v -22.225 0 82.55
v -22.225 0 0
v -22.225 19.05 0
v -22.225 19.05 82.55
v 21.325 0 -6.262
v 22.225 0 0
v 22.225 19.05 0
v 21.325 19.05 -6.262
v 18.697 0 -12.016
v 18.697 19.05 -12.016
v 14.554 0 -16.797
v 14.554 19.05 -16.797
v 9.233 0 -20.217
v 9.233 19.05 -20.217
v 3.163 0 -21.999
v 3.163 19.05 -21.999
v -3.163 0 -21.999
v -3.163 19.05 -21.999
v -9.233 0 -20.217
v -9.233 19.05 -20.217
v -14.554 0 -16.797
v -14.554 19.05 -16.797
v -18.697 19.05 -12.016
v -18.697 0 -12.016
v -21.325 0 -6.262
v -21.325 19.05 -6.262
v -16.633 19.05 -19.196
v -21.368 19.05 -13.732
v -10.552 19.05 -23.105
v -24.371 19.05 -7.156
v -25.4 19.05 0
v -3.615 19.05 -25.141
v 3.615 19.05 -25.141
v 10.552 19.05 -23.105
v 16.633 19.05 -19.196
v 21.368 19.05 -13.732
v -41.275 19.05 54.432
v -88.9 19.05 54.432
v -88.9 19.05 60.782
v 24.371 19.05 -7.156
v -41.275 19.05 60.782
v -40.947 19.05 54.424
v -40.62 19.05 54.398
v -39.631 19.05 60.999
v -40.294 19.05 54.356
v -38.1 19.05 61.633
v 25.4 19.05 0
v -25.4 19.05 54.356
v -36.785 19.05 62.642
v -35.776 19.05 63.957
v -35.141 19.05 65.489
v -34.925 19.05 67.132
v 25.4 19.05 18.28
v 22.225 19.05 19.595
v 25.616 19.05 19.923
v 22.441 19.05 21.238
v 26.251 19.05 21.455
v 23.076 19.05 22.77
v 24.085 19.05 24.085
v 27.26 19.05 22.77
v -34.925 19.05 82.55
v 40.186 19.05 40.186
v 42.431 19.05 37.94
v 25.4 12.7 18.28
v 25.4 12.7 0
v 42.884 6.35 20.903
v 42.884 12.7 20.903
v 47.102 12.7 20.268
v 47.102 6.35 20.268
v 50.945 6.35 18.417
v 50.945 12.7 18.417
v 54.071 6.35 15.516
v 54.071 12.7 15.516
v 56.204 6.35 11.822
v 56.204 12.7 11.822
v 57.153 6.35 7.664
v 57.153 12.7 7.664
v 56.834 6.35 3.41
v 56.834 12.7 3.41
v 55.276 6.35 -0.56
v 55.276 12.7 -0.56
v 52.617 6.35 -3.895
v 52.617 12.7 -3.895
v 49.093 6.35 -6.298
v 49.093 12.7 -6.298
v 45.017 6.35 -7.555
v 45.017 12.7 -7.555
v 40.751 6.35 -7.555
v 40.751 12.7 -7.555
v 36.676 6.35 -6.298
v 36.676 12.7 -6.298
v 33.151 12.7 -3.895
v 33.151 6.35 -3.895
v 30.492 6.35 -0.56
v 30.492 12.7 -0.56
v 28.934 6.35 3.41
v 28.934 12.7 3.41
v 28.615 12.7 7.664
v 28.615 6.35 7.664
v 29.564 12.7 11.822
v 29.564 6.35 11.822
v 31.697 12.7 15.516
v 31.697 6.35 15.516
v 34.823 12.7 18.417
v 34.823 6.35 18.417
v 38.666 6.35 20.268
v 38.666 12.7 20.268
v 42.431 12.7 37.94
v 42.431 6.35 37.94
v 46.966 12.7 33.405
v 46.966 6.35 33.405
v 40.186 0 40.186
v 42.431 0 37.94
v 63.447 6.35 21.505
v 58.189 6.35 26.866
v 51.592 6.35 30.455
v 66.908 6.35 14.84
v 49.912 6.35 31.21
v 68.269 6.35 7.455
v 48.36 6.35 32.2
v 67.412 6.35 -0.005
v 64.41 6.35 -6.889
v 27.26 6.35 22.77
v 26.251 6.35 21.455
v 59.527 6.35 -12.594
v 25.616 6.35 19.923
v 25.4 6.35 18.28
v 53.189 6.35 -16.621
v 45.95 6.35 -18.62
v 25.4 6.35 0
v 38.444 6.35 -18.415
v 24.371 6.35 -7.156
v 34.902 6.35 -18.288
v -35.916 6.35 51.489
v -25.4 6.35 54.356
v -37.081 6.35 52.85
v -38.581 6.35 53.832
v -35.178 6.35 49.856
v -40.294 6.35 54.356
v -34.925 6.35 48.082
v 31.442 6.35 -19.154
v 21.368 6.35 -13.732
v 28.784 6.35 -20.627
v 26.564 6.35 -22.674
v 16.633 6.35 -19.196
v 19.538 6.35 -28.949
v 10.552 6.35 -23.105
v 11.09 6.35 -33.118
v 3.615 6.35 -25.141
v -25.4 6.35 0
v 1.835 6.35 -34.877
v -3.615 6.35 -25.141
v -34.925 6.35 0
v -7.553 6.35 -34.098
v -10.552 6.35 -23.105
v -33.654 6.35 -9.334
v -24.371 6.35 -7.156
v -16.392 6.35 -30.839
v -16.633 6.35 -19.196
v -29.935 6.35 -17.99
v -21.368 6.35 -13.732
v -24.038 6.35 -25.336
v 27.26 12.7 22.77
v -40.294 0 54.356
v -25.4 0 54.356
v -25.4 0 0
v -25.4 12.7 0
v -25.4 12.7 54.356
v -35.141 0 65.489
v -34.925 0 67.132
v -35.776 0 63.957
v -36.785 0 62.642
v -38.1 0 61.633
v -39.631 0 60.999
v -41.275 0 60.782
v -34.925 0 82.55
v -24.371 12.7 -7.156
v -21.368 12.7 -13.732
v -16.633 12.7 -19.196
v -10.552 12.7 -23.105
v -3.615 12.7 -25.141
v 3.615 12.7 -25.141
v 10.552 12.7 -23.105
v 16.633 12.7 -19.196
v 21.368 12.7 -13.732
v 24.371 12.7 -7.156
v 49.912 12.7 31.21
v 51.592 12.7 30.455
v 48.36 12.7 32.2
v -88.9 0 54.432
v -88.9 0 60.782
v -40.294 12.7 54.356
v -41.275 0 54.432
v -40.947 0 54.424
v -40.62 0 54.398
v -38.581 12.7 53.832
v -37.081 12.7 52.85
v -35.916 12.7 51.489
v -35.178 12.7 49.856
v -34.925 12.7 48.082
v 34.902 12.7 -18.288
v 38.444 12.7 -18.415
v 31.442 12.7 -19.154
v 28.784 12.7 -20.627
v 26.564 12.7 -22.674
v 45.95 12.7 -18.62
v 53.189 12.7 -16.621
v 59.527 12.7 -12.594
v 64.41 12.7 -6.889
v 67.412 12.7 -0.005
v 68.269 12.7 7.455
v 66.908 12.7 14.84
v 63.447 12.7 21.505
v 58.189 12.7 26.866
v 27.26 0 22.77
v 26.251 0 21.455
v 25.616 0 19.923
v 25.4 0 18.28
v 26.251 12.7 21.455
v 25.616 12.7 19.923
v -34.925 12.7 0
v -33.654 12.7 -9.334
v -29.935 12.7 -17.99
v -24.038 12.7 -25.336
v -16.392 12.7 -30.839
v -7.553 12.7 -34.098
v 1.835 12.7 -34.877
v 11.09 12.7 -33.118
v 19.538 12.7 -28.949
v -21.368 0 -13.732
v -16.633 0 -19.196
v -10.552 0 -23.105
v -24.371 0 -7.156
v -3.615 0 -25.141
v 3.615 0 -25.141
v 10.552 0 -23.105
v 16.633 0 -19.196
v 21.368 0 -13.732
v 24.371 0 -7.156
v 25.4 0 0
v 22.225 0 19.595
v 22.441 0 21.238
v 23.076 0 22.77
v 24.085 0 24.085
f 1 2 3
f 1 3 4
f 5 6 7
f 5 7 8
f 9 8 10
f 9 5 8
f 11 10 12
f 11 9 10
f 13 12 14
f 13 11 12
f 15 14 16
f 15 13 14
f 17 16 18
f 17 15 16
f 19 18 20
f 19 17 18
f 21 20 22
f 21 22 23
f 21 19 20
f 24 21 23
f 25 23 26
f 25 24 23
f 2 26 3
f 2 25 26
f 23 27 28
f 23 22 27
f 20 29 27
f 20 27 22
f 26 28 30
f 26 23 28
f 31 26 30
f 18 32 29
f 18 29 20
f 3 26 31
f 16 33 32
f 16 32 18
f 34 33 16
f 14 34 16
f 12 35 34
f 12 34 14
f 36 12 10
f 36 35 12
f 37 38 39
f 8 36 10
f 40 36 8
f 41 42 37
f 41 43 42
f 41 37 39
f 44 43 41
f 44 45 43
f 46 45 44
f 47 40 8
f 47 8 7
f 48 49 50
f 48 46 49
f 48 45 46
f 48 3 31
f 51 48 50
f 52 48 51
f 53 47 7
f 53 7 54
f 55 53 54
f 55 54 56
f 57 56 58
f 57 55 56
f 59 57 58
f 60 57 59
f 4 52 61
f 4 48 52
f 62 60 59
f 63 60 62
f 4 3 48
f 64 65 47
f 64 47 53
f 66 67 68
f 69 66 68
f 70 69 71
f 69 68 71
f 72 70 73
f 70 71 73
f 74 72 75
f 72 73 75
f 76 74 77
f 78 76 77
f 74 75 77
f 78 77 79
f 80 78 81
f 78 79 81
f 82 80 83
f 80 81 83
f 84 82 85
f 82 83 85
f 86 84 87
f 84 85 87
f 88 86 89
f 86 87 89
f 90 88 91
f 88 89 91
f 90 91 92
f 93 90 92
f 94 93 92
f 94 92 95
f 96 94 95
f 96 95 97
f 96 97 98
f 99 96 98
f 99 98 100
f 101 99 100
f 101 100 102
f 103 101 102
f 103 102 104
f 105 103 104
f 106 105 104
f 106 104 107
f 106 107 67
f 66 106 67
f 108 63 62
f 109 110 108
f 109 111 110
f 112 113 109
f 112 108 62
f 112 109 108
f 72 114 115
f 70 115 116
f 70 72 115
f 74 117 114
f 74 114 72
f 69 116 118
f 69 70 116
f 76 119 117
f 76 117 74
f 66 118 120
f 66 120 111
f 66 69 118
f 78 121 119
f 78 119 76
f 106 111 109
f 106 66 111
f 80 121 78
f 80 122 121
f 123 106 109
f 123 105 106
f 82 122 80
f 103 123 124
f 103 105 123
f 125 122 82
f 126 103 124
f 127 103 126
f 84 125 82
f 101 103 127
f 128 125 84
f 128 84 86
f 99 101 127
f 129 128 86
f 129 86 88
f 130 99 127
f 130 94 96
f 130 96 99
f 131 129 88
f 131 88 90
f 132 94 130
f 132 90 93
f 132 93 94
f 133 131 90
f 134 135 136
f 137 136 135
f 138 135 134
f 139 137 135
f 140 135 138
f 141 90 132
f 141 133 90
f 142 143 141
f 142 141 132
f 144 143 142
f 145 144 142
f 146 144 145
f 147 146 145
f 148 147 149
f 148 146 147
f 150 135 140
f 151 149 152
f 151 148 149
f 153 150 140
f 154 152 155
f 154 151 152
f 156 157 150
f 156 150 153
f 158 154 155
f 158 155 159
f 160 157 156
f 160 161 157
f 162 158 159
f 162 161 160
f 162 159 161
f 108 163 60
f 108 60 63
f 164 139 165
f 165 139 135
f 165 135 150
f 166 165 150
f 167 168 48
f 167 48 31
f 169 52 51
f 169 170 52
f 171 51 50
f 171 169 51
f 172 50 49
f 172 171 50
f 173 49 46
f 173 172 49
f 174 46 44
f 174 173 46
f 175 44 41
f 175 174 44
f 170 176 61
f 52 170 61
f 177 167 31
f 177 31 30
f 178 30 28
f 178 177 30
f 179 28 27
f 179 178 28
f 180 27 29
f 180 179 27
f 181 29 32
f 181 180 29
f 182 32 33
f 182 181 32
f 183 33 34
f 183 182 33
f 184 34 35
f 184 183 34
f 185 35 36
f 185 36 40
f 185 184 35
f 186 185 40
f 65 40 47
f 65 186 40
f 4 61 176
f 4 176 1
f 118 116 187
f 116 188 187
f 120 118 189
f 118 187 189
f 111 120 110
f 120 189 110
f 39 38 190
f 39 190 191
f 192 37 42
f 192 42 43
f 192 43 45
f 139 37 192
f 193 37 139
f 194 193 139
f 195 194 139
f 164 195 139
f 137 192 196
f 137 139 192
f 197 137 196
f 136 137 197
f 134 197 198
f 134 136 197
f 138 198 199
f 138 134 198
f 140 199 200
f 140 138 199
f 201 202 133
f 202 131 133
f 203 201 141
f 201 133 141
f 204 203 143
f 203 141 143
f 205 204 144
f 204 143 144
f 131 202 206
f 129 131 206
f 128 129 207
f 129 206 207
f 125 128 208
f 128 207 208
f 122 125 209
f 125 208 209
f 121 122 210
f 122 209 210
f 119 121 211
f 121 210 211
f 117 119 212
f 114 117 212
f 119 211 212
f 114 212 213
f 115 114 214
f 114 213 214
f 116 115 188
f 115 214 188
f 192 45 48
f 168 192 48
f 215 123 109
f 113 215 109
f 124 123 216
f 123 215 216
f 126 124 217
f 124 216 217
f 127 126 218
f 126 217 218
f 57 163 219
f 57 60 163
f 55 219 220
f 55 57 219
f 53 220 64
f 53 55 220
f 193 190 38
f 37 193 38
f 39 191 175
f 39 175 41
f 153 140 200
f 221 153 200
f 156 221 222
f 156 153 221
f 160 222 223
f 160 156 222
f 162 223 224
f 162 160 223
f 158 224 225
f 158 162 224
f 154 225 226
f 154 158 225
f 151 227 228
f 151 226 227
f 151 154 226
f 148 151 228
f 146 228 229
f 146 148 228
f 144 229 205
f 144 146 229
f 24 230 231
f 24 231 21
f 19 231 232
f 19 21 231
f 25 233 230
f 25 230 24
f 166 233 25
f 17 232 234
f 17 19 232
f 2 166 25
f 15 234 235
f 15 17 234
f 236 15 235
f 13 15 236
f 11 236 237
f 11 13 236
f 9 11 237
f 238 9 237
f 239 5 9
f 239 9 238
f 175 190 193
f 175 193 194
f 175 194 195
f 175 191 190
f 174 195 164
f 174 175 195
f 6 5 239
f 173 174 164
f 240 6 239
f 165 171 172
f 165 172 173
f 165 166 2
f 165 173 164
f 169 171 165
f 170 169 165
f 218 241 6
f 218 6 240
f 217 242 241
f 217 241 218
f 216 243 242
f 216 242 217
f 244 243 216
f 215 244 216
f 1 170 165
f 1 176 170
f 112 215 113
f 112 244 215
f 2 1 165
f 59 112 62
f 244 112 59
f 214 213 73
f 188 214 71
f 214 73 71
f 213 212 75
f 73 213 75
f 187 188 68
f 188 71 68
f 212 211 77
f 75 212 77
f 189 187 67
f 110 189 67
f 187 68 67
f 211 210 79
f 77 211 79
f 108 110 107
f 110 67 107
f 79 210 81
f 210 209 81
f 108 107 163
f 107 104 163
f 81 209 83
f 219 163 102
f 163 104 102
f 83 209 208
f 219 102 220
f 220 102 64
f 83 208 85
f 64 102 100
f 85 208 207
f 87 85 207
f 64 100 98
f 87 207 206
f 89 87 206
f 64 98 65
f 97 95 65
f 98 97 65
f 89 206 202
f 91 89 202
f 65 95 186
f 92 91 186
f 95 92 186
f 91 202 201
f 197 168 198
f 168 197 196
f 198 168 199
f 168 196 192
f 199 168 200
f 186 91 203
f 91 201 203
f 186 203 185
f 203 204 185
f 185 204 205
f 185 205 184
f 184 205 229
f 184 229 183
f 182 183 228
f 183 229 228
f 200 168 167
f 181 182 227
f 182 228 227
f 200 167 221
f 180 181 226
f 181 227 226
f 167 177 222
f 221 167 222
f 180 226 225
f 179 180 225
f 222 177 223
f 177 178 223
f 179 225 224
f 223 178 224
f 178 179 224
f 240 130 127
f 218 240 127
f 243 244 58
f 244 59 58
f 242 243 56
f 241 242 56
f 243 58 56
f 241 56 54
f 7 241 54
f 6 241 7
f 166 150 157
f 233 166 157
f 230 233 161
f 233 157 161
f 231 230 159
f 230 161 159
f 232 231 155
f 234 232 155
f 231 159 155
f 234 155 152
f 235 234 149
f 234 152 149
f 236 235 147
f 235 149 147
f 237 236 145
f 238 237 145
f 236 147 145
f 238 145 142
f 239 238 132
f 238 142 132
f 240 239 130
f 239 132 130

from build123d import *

# Parameters (mm, degrees)
BOSS_EXTRUDE1_DEPTH = 19.05
CUT_EXTRUDE3_START  = -6.35
CUT_EXTRUDE3_DEPTH  = 6.35
FILLET1_R           = 6.35
FILLET2_R           = 6.35
SKETCH4_W           = 6.35
SKETCH4_H           = 19.05
BOSS_EXTRUDE2_DEPTH = 63.5
SKETCH6_W           = 12.7
SKETCH6_H           = 19.05
BOSS_EXTRUDE3_DEPTH = 28.194
FILLET4_R           = 6.35
FILLET5_R           = 6.35
BOSS_EXTRUDE4_DEPTH = 6.35
FILLET6_R           = 12.7
FILLET7_R           = 12.7
SKETCH9_R           = 14.309078451
CUT_EXTRUDE5_DEPTH  = 122.979516723


with BuildPart() as part:
    # Sketch1 → Boss-Extrude1 (new body)
    with BuildSketch(Plane(origin=(0, 0, 0), x_dir=(1, 0, 0), z_dir=(0, 1, 0))):
        with BuildLine():
            Line((-22.225, 0), (-22.225, -82.55))
            Line((-22.225, -82.55), (-34.925, -82.55))
            Line((-34.925, -82.55), (-34.925, 0))
            ThreePointArc((-34.925, 0), (0, 34.925), (34.925, 0))
            Line((34.925, 0), (34.925, -16.964487758))
            Line((34.925, -16.964487758), (49.165768363, -31.205256121))
            Line((49.165768363, -31.205256121), (40.185512242, -40.185512242))
            Line((40.185512242, -40.185512242), (22.225, -22.225))
            Line((22.225, -22.225), (22.225, 0))
            ThreePointArc((22.225, 0), (0, 22.225), (-22.225, 0))
        make_face()
    extrude(amount=BOSS_EXTRUDE1_DEPTH)

    # Sketch3 → Cut-Extrude3 (cut)
    with BuildSketch(Plane(origin=(0, 19.05, 0), x_dir=(1, 0, 0), z_dir=(0, 1, 0)).offset(CUT_EXTRUDE3_START)):
        with BuildLine():
            Line((-34.925, 0), (-34.925, -82.55))
            Line((-34.925, -82.55), (-25.4, -82.55))
            Line((-25.4, -82.55), (-25.4, 0))
            ThreePointArc((-25.4, 0), (0, 25.4), (25.4, 0))
            Line((25.4, 0), (25.4, -20.909871939))
            Line((25.4, -20.909871939), (42.430576272, -37.940448212))
            Line((42.430576272, -37.940448212), (49.165768363, -31.205256121))
            Line((49.165768363, -31.205256121), (34.925, -16.964487758))
            Line((34.925, -16.964487758), (34.925, 0))
            ThreePointArc((34.925, 0), (0, 34.925), (-34.925, 0))
        make_face()
    cut_extrude3 = extrude(amount=CUT_EXTRUDE3_DEPTH, mode=Mode.SUBTRACT)

    # Mirror1: Cut-Extrude3 across plane
    add(cut_extrude3.mirror(Plane.ZX.offset(9.525)), mode=Mode.SUBTRACT)

    # Fillet1
    fillet1_edges = [part.edges().sort_by_distance(p)[0] for p in [
        (34.925, 9.525, 16.964487758),
        (25.4, 15.875, 20.909871939),
        (25.4, 3.175, 20.909871939),
    ]]
    fillet(fillet1_edges, radius=FILLET1_R)

    # Fillet2
    fillet2_edges = [part.edges().sort_by_distance(p)[0] for p in [
        (22.225, 9.525, 22.225),
    ]]
    fillet(fillet2_edges, radius=FILLET2_R)

    # Sketch4 → Boss-Extrude2 (add)
    with BuildSketch(Plane.ZY.offset(25.4)):
        with Locations((57.6072, 9.525)):
            Rectangle(SKETCH4_W, SKETCH4_H)
    extrude(amount=BOSS_EXTRUDE2_DEPTH)

    # Sketch6 → Boss-Extrude3 (add)
    with BuildSketch(Plane.XY.offset(82.55)):
        with Locations((-28.575, 9.525)):
            Rectangle(SKETCH6_W, SKETCH6_H)
    extrude(amount=-BOSS_EXTRUDE3_DEPTH)

    # Fillet4
    fillet4_edges = [part.edges().sort_by_distance(p)[0] for p in [
        (-34.925, 9.525, 60.7822),
    ]]
    fillet(fillet4_edges, radius=FILLET4_R)

    # Fillet5
    fillet5_edges = [part.edges().sort_by_distance(p)[0] for p in [
        (-34.925, 9.525, 54.4322),
    ]]
    fillet(fillet5_edges, radius=FILLET5_R)

    # Sketch8 → Boss-Extrude4 (add)
    with BuildSketch(Plane(origin=(0, 12.7, 0), x_dir=(1, 0, 0), z_dir=(0, 1, 0))):
        with BuildLine():
            Line((34.925, -14.334231637), (34.925, 0))
            ThreePointArc((34.925, 0), (33.953727024, 8.179244844), (31.093930783, 15.903556001))
            ThreePointArc((31.093930783, 15.903556001), (66.598964527, 2.503206576), (49.165768363, -31.205256121))
            Line((49.165768363, -31.205256121), (36.784871939, -18.824359697))
            ThreePointArc((36.784871939, -18.824359697), (35.408364969, -16.764271432), (34.925, -14.334231637))
        make_face()
    extrude(amount=-BOSS_EXTRUDE4_DEPTH)

    # Fillet6
    fillet6_edges = [part.edges().sort_by_distance(p)[0] for p in [
        (31.093930783, 9.525, -15.903556001),
    ]]
    fillet(fillet6_edges, radius=FILLET6_R)

    # Fillet7
    fillet7_edges = [part.edges().sort_by_distance(p)[0] for p in [
        (49.165768363, 9.525, 31.205256121),
    ]]
    fillet(fillet7_edges, radius=FILLET7_R)

    # Sketch9 → Cut-Extrude5 (cut, through all)
    with BuildSketch(Plane(origin=(0, 12.7, 0), x_dir=(1, 0, 0), z_dir=(0, 1, 0))):
        with Locations(Location((42.884078451, -6.594275404, 0), (0, 0, 270))):
            Circle(SKETCH9_R)
    extrude(amount=-CUT_EXTRUDE5_DEPTH, mode=Mode.SUBTRACT)


solid = part.part
